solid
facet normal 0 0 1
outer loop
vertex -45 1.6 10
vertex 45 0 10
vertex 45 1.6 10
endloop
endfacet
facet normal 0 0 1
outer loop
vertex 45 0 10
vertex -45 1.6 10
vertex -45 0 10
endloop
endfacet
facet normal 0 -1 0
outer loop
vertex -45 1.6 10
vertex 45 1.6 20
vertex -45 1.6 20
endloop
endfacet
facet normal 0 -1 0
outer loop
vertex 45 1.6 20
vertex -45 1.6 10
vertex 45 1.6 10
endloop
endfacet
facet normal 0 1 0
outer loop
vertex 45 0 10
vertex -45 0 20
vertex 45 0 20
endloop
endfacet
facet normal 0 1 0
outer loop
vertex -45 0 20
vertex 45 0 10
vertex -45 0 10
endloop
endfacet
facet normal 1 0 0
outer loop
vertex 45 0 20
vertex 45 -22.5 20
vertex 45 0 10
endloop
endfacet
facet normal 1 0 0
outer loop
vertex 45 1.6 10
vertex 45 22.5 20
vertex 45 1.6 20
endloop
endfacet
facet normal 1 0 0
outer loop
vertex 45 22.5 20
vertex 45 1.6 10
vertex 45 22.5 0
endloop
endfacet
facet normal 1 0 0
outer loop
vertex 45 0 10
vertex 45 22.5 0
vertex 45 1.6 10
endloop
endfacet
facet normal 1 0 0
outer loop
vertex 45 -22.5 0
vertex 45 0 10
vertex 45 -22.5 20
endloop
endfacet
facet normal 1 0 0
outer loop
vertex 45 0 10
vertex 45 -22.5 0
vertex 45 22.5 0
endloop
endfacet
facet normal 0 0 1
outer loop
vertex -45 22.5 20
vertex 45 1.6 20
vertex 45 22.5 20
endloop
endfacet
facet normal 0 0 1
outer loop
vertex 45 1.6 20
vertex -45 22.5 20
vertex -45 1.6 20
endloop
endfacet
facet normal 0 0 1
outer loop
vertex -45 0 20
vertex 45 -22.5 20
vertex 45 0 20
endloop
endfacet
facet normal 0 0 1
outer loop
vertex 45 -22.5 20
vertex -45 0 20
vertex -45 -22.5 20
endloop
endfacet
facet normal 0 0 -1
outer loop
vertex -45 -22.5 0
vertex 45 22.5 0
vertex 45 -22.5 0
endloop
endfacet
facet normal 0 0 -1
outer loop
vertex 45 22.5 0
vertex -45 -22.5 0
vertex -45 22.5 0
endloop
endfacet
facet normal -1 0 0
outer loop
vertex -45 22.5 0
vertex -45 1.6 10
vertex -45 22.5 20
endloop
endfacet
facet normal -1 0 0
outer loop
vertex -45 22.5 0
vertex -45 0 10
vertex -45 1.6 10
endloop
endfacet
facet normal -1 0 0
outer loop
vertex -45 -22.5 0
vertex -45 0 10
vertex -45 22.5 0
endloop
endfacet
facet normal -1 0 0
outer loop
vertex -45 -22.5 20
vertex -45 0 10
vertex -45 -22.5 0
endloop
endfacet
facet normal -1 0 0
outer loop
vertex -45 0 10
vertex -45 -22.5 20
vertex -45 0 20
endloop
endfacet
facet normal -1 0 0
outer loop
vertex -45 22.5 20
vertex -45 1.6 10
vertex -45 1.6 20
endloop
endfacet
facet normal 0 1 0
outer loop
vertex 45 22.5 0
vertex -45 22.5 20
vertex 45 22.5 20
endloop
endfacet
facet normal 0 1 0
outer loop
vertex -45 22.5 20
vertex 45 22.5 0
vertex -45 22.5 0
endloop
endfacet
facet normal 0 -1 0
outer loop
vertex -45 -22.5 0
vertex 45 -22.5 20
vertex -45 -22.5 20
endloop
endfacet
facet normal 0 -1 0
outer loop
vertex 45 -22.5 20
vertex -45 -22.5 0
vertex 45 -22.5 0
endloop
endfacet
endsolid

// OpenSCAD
// Slide drying rack - holds 10 microscope slides standing upright on their long edge
// Units: mm. Print orientation: base on XY plane, slots open upward (+Z).

// ---------------- Parameters ----------------
block_len    = 90;     // block length along X
block_wid    = 45;     // block width along Y
block_ht     = 20;     // block height along Z

slot_count   = 10;     // number of slide slots
slot_len     = 77;     // slot length along X (slide length + clearance)
slot_wid     = 1.6;    // slot width along Y
slot_depth   = 10;     // slot depth from top face along Z
slot_pitch   = 3.5;    // centre-to-centre spacing of slots along Y

eps          = 0.5;    // overshoot so cutters pass cleanly through faces

$fn = 64;

// ---------------- Model ----------------
difference() {
    // Base block, centred in X and Y, sitting on z = 0
    translate([-block_len / 2, -block_wid / 2, 0])
        cube([block_len, block_wid, block_ht]);

    // Parallel slots, centred as a group in X and Y
    for (i = [0 : slot_count - 1]) {
        x = (i - (slot_count - 1) / 2) * slot_pitch;
        translate([x - slot_len / 2, 0, block_ht - slot_depth])
            cube([slot_len, slot_wid, slot_depth + eps]);
    }
}
